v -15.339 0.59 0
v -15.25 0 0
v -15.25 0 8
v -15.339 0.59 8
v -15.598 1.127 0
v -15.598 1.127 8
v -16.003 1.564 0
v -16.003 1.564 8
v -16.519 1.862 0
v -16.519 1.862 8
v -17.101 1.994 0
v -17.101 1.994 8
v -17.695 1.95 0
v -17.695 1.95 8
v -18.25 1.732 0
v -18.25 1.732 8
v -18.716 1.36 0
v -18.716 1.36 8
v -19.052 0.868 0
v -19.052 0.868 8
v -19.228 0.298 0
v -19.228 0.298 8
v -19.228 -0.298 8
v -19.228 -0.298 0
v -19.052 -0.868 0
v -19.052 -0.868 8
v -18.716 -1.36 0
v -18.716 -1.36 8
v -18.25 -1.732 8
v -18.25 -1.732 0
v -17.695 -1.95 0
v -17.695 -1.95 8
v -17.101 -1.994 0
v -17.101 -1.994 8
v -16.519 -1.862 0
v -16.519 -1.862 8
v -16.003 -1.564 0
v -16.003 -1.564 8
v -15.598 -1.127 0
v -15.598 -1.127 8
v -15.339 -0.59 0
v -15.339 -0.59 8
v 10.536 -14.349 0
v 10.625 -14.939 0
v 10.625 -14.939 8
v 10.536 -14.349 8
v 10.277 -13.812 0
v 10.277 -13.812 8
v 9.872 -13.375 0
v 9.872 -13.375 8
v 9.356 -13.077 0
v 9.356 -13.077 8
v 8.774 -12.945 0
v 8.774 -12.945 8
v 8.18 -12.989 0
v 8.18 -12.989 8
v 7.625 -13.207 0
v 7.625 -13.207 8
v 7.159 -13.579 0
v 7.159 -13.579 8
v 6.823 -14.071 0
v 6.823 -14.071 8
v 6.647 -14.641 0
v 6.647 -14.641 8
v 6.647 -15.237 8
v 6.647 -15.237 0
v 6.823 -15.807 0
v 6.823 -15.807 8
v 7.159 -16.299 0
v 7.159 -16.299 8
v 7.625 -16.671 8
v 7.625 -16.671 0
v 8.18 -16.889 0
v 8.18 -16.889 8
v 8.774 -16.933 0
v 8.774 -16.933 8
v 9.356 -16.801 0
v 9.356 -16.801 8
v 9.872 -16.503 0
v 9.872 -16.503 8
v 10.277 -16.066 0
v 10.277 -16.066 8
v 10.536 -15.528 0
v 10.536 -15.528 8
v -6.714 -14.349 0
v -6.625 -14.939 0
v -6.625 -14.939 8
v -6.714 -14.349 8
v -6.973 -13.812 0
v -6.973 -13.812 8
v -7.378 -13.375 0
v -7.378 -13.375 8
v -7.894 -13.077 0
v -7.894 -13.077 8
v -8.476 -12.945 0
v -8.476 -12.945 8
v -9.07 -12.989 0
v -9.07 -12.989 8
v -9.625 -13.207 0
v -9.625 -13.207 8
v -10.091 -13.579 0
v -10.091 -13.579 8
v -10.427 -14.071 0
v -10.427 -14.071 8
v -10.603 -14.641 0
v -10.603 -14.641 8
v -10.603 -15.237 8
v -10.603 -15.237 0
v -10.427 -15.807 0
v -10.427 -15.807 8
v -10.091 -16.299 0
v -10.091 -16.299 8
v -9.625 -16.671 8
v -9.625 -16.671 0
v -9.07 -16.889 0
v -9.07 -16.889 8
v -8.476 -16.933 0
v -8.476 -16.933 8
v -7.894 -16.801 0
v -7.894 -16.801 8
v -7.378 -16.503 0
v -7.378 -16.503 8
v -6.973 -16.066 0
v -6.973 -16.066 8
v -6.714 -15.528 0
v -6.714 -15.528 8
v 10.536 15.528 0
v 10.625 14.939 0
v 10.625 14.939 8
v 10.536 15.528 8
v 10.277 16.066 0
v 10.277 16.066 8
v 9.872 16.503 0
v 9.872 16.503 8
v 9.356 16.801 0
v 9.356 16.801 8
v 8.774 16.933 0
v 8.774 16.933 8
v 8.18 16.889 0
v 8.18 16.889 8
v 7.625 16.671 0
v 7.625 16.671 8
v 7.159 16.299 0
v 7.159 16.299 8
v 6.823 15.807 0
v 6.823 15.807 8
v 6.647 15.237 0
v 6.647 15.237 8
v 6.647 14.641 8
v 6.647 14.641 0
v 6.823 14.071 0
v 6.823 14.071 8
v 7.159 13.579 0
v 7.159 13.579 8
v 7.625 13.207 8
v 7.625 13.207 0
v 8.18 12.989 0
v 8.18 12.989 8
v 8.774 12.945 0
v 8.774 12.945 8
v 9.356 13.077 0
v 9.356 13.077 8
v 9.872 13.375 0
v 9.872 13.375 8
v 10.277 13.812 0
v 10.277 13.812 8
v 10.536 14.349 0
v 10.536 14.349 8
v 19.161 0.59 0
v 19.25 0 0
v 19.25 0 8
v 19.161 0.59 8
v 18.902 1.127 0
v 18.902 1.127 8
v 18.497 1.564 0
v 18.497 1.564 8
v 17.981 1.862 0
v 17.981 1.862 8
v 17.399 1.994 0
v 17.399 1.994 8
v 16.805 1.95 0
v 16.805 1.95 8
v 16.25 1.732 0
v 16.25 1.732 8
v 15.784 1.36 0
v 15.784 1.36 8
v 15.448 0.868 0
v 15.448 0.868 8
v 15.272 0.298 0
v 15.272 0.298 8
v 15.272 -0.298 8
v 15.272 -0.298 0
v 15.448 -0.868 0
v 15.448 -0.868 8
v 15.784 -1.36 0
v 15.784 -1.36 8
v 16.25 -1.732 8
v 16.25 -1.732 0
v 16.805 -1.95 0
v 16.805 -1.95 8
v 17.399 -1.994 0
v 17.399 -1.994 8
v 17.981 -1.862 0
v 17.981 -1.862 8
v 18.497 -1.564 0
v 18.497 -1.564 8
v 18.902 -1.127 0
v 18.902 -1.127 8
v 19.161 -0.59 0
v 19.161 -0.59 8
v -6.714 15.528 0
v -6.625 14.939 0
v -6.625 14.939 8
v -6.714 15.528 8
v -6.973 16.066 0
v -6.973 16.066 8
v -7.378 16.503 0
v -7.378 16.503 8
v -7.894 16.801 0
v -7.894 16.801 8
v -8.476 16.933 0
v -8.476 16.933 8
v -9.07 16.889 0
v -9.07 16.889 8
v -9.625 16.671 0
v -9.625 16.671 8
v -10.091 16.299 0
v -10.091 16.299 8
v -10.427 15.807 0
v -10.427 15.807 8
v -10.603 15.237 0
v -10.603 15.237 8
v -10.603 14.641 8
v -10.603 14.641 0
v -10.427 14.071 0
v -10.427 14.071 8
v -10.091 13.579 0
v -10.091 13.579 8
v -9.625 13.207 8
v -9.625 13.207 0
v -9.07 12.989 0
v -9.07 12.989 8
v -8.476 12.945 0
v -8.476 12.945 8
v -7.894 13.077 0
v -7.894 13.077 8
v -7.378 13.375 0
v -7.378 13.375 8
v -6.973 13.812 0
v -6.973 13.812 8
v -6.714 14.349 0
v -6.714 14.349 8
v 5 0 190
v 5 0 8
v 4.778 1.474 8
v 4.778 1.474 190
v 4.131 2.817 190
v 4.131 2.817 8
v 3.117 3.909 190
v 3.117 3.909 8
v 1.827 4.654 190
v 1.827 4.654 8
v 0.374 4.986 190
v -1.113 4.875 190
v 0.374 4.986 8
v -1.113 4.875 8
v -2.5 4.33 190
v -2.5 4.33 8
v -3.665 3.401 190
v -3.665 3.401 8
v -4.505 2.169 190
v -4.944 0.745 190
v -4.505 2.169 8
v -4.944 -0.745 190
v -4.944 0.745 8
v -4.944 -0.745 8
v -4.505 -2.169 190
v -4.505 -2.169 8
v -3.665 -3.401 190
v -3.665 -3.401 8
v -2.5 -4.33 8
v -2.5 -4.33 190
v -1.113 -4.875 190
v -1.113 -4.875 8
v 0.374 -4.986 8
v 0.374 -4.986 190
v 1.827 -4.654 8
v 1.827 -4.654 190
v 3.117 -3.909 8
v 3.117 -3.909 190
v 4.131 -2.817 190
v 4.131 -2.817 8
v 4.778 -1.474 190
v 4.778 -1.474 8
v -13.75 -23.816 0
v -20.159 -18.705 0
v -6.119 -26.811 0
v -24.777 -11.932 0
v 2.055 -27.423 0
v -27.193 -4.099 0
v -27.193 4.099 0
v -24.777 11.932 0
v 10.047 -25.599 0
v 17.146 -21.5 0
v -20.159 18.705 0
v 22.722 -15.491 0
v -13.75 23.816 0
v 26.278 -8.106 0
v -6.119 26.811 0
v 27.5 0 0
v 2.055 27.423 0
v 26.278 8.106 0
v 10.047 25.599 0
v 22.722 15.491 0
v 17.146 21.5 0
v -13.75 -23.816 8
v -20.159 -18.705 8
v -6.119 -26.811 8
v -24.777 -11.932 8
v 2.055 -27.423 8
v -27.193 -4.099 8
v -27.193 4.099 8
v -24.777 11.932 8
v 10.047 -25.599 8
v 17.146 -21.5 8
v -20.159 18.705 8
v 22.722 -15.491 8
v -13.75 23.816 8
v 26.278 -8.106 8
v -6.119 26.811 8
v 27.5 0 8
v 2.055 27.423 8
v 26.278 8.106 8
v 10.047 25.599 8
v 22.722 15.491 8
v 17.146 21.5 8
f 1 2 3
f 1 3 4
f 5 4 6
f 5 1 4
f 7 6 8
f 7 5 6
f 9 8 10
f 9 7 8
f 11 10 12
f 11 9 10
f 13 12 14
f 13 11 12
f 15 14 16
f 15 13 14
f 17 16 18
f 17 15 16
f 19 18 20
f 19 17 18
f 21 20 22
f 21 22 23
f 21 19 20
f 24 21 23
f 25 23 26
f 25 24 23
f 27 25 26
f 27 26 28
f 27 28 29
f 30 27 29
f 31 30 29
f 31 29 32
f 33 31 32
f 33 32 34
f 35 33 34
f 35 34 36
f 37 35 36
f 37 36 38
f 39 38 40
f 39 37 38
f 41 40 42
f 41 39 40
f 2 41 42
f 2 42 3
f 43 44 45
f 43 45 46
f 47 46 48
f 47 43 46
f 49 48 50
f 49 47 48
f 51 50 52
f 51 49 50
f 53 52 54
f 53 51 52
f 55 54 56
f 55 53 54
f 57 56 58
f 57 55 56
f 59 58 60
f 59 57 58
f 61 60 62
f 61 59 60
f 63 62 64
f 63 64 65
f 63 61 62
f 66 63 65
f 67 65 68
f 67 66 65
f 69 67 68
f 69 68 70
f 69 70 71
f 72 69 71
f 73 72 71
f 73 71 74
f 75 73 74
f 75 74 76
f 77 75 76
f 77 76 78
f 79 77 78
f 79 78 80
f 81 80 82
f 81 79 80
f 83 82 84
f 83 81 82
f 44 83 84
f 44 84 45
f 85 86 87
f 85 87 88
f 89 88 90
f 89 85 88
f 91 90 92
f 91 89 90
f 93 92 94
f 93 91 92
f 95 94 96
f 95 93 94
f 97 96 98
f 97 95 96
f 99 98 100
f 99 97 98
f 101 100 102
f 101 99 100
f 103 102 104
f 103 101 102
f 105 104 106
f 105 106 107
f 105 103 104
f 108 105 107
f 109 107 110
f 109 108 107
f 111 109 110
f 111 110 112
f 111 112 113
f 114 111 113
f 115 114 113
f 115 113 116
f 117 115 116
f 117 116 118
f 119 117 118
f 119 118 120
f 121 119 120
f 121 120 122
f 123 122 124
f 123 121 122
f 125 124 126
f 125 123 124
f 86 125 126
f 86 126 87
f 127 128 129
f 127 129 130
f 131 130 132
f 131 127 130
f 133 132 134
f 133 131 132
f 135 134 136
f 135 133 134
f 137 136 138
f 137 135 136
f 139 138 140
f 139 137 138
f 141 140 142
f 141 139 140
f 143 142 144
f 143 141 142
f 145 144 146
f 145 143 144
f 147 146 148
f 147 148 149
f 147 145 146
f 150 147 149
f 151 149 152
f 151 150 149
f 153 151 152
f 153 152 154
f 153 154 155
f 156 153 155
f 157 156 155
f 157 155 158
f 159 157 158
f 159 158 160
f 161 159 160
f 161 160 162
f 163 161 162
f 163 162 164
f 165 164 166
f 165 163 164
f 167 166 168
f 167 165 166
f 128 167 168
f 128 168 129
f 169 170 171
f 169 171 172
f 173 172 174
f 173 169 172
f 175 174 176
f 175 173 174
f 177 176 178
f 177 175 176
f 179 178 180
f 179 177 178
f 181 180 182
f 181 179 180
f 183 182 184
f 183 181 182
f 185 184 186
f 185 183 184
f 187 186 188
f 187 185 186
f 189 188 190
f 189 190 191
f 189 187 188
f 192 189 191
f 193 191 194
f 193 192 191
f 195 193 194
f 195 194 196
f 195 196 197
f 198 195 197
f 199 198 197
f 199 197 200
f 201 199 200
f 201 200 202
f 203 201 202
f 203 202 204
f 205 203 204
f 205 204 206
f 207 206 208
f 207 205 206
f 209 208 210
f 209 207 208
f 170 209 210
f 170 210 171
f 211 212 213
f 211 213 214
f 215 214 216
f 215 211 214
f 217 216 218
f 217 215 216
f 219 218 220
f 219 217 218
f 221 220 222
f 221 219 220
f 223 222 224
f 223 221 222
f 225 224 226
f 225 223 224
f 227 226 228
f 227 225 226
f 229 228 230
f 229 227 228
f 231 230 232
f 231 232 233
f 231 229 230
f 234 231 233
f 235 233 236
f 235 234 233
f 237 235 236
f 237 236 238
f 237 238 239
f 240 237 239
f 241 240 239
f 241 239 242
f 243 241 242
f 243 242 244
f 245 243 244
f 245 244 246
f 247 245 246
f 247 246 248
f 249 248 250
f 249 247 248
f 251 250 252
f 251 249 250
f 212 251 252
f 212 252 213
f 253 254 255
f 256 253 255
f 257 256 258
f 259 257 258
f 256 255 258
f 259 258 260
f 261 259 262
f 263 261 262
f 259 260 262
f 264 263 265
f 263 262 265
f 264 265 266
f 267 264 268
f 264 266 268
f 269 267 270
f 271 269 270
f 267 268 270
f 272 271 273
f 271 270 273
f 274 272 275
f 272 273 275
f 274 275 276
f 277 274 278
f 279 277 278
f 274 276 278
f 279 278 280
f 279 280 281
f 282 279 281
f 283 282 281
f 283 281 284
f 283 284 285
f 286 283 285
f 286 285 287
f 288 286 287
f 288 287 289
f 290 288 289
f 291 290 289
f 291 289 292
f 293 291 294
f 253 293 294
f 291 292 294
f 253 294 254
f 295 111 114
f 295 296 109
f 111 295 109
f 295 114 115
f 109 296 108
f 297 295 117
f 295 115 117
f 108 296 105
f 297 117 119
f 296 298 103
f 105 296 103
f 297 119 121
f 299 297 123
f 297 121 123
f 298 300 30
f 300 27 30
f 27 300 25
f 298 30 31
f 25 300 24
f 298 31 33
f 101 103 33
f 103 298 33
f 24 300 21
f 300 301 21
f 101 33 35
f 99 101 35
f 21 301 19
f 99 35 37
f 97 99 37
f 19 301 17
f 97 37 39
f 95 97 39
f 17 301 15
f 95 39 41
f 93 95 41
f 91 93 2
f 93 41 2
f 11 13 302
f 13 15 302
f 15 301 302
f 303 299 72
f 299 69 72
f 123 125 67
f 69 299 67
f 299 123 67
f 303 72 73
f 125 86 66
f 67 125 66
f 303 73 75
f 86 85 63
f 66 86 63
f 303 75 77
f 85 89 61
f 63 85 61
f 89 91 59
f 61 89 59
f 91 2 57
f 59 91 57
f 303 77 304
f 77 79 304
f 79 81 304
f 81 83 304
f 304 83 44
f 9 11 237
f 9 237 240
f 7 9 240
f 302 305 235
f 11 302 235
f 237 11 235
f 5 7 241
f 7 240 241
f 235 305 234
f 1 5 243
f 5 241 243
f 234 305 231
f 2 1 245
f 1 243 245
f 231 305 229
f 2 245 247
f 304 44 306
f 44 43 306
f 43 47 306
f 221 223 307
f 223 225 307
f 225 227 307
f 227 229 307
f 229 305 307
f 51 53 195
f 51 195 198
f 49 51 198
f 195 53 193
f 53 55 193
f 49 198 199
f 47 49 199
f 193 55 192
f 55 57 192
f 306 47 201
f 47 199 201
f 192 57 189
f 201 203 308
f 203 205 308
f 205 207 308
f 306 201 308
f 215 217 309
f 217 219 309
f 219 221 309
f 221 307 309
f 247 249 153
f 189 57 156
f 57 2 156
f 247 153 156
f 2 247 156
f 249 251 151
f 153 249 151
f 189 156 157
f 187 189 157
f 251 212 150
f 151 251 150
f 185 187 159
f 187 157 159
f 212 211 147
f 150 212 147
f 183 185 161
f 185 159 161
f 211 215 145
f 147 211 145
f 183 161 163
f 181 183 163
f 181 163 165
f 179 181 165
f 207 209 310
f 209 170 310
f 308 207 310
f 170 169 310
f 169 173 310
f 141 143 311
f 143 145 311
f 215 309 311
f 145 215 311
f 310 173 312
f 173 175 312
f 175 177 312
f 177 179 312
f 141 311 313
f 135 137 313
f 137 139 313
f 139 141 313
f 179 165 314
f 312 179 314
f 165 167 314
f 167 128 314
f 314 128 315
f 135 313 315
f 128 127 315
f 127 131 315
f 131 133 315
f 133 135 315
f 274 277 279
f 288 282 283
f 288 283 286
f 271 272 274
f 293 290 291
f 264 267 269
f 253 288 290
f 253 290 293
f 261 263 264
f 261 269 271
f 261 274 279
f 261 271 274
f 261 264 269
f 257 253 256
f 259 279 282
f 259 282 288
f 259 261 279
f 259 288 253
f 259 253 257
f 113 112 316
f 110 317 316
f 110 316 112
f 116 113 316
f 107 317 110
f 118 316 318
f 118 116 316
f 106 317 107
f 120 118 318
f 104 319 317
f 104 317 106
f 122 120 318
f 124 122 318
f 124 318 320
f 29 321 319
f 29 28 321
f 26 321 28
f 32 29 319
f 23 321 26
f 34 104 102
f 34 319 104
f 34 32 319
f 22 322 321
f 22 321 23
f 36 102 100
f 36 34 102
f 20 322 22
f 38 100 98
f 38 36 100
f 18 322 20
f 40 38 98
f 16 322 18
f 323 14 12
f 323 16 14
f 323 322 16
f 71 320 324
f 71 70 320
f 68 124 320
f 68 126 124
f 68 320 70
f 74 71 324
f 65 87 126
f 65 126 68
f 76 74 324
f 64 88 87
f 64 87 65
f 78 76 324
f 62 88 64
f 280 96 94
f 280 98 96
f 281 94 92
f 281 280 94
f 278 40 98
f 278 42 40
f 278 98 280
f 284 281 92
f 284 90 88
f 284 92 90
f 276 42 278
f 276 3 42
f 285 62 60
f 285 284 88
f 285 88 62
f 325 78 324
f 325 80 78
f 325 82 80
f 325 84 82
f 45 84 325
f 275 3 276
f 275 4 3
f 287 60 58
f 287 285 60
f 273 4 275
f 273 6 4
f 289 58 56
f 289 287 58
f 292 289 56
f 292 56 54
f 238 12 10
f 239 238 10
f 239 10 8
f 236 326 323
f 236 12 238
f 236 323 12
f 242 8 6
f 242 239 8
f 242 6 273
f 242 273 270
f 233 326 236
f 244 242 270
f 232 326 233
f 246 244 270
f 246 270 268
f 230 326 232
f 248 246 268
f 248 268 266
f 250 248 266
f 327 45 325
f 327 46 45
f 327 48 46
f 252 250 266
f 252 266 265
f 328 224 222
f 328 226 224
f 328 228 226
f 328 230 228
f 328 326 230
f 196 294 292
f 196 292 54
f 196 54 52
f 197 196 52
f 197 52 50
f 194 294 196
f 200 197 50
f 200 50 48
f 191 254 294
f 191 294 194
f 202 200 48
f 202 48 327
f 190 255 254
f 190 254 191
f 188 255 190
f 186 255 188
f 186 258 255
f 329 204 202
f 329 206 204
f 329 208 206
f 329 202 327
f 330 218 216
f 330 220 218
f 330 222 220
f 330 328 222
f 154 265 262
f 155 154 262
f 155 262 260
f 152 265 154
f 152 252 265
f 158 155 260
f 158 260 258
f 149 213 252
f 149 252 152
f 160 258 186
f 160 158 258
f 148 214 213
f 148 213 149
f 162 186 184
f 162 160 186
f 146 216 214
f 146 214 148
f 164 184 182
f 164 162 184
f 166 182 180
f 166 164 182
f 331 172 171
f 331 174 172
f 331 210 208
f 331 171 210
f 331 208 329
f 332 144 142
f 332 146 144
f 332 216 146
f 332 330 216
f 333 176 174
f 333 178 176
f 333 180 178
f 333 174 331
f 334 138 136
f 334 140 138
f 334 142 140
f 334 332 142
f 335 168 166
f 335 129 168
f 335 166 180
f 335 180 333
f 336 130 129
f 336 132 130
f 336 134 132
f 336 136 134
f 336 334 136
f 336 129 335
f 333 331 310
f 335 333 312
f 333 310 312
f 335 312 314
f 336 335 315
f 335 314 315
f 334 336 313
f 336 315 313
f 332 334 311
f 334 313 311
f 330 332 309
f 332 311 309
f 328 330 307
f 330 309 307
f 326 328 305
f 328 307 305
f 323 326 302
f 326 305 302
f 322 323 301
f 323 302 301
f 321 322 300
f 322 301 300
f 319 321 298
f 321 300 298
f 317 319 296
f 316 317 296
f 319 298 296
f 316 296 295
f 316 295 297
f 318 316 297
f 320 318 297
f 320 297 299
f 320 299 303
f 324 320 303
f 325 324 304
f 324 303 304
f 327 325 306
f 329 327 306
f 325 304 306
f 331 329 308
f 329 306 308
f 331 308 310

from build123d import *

# Parameters (mm, degrees)
SKETCH_1_R      = 27.5
SKETCH_1_R_2    = 2
EXTRUDE_1_DEPTH = 8
SKETCH_2_R      = 5
EXTRUDE_2_DEPTH = 182


with BuildPart() as part:
    # 草图1 → 凸台-拉伸1 (new body)
    with BuildSketch(Plane.XY):
        Circle(SKETCH_1_R)
        with Locations((-17.25, 0)):
            Circle(SKETCH_1_R_2, mode=Mode.SUBTRACT)
        with Locations((-8.625, 14.938938215)):
            Circle(SKETCH_1_R_2, mode=Mode.SUBTRACT)
        with Locations((8.625, 14.938938215)):
            Circle(SKETCH_1_R_2, mode=Mode.SUBTRACT)
        with Locations((17.25, 0)):
            Circle(SKETCH_1_R_2, mode=Mode.SUBTRACT)
        with Locations((8.625, -14.938938215)):
            Circle(SKETCH_1_R_2, mode=Mode.SUBTRACT)
        with Locations((-8.625, -14.938938215)):
            Circle(SKETCH_1_R_2, mode=Mode.SUBTRACT)
    extrude(amount=EXTRUDE_1_DEPTH)

    # 草图2 → 凸台-拉伸2 (add)
    with BuildSketch(Plane.XY.offset(8)):
        Circle(SKETCH_2_R)
    extrude(amount=EXTRUDE_2_DEPTH)


solid = part.part
